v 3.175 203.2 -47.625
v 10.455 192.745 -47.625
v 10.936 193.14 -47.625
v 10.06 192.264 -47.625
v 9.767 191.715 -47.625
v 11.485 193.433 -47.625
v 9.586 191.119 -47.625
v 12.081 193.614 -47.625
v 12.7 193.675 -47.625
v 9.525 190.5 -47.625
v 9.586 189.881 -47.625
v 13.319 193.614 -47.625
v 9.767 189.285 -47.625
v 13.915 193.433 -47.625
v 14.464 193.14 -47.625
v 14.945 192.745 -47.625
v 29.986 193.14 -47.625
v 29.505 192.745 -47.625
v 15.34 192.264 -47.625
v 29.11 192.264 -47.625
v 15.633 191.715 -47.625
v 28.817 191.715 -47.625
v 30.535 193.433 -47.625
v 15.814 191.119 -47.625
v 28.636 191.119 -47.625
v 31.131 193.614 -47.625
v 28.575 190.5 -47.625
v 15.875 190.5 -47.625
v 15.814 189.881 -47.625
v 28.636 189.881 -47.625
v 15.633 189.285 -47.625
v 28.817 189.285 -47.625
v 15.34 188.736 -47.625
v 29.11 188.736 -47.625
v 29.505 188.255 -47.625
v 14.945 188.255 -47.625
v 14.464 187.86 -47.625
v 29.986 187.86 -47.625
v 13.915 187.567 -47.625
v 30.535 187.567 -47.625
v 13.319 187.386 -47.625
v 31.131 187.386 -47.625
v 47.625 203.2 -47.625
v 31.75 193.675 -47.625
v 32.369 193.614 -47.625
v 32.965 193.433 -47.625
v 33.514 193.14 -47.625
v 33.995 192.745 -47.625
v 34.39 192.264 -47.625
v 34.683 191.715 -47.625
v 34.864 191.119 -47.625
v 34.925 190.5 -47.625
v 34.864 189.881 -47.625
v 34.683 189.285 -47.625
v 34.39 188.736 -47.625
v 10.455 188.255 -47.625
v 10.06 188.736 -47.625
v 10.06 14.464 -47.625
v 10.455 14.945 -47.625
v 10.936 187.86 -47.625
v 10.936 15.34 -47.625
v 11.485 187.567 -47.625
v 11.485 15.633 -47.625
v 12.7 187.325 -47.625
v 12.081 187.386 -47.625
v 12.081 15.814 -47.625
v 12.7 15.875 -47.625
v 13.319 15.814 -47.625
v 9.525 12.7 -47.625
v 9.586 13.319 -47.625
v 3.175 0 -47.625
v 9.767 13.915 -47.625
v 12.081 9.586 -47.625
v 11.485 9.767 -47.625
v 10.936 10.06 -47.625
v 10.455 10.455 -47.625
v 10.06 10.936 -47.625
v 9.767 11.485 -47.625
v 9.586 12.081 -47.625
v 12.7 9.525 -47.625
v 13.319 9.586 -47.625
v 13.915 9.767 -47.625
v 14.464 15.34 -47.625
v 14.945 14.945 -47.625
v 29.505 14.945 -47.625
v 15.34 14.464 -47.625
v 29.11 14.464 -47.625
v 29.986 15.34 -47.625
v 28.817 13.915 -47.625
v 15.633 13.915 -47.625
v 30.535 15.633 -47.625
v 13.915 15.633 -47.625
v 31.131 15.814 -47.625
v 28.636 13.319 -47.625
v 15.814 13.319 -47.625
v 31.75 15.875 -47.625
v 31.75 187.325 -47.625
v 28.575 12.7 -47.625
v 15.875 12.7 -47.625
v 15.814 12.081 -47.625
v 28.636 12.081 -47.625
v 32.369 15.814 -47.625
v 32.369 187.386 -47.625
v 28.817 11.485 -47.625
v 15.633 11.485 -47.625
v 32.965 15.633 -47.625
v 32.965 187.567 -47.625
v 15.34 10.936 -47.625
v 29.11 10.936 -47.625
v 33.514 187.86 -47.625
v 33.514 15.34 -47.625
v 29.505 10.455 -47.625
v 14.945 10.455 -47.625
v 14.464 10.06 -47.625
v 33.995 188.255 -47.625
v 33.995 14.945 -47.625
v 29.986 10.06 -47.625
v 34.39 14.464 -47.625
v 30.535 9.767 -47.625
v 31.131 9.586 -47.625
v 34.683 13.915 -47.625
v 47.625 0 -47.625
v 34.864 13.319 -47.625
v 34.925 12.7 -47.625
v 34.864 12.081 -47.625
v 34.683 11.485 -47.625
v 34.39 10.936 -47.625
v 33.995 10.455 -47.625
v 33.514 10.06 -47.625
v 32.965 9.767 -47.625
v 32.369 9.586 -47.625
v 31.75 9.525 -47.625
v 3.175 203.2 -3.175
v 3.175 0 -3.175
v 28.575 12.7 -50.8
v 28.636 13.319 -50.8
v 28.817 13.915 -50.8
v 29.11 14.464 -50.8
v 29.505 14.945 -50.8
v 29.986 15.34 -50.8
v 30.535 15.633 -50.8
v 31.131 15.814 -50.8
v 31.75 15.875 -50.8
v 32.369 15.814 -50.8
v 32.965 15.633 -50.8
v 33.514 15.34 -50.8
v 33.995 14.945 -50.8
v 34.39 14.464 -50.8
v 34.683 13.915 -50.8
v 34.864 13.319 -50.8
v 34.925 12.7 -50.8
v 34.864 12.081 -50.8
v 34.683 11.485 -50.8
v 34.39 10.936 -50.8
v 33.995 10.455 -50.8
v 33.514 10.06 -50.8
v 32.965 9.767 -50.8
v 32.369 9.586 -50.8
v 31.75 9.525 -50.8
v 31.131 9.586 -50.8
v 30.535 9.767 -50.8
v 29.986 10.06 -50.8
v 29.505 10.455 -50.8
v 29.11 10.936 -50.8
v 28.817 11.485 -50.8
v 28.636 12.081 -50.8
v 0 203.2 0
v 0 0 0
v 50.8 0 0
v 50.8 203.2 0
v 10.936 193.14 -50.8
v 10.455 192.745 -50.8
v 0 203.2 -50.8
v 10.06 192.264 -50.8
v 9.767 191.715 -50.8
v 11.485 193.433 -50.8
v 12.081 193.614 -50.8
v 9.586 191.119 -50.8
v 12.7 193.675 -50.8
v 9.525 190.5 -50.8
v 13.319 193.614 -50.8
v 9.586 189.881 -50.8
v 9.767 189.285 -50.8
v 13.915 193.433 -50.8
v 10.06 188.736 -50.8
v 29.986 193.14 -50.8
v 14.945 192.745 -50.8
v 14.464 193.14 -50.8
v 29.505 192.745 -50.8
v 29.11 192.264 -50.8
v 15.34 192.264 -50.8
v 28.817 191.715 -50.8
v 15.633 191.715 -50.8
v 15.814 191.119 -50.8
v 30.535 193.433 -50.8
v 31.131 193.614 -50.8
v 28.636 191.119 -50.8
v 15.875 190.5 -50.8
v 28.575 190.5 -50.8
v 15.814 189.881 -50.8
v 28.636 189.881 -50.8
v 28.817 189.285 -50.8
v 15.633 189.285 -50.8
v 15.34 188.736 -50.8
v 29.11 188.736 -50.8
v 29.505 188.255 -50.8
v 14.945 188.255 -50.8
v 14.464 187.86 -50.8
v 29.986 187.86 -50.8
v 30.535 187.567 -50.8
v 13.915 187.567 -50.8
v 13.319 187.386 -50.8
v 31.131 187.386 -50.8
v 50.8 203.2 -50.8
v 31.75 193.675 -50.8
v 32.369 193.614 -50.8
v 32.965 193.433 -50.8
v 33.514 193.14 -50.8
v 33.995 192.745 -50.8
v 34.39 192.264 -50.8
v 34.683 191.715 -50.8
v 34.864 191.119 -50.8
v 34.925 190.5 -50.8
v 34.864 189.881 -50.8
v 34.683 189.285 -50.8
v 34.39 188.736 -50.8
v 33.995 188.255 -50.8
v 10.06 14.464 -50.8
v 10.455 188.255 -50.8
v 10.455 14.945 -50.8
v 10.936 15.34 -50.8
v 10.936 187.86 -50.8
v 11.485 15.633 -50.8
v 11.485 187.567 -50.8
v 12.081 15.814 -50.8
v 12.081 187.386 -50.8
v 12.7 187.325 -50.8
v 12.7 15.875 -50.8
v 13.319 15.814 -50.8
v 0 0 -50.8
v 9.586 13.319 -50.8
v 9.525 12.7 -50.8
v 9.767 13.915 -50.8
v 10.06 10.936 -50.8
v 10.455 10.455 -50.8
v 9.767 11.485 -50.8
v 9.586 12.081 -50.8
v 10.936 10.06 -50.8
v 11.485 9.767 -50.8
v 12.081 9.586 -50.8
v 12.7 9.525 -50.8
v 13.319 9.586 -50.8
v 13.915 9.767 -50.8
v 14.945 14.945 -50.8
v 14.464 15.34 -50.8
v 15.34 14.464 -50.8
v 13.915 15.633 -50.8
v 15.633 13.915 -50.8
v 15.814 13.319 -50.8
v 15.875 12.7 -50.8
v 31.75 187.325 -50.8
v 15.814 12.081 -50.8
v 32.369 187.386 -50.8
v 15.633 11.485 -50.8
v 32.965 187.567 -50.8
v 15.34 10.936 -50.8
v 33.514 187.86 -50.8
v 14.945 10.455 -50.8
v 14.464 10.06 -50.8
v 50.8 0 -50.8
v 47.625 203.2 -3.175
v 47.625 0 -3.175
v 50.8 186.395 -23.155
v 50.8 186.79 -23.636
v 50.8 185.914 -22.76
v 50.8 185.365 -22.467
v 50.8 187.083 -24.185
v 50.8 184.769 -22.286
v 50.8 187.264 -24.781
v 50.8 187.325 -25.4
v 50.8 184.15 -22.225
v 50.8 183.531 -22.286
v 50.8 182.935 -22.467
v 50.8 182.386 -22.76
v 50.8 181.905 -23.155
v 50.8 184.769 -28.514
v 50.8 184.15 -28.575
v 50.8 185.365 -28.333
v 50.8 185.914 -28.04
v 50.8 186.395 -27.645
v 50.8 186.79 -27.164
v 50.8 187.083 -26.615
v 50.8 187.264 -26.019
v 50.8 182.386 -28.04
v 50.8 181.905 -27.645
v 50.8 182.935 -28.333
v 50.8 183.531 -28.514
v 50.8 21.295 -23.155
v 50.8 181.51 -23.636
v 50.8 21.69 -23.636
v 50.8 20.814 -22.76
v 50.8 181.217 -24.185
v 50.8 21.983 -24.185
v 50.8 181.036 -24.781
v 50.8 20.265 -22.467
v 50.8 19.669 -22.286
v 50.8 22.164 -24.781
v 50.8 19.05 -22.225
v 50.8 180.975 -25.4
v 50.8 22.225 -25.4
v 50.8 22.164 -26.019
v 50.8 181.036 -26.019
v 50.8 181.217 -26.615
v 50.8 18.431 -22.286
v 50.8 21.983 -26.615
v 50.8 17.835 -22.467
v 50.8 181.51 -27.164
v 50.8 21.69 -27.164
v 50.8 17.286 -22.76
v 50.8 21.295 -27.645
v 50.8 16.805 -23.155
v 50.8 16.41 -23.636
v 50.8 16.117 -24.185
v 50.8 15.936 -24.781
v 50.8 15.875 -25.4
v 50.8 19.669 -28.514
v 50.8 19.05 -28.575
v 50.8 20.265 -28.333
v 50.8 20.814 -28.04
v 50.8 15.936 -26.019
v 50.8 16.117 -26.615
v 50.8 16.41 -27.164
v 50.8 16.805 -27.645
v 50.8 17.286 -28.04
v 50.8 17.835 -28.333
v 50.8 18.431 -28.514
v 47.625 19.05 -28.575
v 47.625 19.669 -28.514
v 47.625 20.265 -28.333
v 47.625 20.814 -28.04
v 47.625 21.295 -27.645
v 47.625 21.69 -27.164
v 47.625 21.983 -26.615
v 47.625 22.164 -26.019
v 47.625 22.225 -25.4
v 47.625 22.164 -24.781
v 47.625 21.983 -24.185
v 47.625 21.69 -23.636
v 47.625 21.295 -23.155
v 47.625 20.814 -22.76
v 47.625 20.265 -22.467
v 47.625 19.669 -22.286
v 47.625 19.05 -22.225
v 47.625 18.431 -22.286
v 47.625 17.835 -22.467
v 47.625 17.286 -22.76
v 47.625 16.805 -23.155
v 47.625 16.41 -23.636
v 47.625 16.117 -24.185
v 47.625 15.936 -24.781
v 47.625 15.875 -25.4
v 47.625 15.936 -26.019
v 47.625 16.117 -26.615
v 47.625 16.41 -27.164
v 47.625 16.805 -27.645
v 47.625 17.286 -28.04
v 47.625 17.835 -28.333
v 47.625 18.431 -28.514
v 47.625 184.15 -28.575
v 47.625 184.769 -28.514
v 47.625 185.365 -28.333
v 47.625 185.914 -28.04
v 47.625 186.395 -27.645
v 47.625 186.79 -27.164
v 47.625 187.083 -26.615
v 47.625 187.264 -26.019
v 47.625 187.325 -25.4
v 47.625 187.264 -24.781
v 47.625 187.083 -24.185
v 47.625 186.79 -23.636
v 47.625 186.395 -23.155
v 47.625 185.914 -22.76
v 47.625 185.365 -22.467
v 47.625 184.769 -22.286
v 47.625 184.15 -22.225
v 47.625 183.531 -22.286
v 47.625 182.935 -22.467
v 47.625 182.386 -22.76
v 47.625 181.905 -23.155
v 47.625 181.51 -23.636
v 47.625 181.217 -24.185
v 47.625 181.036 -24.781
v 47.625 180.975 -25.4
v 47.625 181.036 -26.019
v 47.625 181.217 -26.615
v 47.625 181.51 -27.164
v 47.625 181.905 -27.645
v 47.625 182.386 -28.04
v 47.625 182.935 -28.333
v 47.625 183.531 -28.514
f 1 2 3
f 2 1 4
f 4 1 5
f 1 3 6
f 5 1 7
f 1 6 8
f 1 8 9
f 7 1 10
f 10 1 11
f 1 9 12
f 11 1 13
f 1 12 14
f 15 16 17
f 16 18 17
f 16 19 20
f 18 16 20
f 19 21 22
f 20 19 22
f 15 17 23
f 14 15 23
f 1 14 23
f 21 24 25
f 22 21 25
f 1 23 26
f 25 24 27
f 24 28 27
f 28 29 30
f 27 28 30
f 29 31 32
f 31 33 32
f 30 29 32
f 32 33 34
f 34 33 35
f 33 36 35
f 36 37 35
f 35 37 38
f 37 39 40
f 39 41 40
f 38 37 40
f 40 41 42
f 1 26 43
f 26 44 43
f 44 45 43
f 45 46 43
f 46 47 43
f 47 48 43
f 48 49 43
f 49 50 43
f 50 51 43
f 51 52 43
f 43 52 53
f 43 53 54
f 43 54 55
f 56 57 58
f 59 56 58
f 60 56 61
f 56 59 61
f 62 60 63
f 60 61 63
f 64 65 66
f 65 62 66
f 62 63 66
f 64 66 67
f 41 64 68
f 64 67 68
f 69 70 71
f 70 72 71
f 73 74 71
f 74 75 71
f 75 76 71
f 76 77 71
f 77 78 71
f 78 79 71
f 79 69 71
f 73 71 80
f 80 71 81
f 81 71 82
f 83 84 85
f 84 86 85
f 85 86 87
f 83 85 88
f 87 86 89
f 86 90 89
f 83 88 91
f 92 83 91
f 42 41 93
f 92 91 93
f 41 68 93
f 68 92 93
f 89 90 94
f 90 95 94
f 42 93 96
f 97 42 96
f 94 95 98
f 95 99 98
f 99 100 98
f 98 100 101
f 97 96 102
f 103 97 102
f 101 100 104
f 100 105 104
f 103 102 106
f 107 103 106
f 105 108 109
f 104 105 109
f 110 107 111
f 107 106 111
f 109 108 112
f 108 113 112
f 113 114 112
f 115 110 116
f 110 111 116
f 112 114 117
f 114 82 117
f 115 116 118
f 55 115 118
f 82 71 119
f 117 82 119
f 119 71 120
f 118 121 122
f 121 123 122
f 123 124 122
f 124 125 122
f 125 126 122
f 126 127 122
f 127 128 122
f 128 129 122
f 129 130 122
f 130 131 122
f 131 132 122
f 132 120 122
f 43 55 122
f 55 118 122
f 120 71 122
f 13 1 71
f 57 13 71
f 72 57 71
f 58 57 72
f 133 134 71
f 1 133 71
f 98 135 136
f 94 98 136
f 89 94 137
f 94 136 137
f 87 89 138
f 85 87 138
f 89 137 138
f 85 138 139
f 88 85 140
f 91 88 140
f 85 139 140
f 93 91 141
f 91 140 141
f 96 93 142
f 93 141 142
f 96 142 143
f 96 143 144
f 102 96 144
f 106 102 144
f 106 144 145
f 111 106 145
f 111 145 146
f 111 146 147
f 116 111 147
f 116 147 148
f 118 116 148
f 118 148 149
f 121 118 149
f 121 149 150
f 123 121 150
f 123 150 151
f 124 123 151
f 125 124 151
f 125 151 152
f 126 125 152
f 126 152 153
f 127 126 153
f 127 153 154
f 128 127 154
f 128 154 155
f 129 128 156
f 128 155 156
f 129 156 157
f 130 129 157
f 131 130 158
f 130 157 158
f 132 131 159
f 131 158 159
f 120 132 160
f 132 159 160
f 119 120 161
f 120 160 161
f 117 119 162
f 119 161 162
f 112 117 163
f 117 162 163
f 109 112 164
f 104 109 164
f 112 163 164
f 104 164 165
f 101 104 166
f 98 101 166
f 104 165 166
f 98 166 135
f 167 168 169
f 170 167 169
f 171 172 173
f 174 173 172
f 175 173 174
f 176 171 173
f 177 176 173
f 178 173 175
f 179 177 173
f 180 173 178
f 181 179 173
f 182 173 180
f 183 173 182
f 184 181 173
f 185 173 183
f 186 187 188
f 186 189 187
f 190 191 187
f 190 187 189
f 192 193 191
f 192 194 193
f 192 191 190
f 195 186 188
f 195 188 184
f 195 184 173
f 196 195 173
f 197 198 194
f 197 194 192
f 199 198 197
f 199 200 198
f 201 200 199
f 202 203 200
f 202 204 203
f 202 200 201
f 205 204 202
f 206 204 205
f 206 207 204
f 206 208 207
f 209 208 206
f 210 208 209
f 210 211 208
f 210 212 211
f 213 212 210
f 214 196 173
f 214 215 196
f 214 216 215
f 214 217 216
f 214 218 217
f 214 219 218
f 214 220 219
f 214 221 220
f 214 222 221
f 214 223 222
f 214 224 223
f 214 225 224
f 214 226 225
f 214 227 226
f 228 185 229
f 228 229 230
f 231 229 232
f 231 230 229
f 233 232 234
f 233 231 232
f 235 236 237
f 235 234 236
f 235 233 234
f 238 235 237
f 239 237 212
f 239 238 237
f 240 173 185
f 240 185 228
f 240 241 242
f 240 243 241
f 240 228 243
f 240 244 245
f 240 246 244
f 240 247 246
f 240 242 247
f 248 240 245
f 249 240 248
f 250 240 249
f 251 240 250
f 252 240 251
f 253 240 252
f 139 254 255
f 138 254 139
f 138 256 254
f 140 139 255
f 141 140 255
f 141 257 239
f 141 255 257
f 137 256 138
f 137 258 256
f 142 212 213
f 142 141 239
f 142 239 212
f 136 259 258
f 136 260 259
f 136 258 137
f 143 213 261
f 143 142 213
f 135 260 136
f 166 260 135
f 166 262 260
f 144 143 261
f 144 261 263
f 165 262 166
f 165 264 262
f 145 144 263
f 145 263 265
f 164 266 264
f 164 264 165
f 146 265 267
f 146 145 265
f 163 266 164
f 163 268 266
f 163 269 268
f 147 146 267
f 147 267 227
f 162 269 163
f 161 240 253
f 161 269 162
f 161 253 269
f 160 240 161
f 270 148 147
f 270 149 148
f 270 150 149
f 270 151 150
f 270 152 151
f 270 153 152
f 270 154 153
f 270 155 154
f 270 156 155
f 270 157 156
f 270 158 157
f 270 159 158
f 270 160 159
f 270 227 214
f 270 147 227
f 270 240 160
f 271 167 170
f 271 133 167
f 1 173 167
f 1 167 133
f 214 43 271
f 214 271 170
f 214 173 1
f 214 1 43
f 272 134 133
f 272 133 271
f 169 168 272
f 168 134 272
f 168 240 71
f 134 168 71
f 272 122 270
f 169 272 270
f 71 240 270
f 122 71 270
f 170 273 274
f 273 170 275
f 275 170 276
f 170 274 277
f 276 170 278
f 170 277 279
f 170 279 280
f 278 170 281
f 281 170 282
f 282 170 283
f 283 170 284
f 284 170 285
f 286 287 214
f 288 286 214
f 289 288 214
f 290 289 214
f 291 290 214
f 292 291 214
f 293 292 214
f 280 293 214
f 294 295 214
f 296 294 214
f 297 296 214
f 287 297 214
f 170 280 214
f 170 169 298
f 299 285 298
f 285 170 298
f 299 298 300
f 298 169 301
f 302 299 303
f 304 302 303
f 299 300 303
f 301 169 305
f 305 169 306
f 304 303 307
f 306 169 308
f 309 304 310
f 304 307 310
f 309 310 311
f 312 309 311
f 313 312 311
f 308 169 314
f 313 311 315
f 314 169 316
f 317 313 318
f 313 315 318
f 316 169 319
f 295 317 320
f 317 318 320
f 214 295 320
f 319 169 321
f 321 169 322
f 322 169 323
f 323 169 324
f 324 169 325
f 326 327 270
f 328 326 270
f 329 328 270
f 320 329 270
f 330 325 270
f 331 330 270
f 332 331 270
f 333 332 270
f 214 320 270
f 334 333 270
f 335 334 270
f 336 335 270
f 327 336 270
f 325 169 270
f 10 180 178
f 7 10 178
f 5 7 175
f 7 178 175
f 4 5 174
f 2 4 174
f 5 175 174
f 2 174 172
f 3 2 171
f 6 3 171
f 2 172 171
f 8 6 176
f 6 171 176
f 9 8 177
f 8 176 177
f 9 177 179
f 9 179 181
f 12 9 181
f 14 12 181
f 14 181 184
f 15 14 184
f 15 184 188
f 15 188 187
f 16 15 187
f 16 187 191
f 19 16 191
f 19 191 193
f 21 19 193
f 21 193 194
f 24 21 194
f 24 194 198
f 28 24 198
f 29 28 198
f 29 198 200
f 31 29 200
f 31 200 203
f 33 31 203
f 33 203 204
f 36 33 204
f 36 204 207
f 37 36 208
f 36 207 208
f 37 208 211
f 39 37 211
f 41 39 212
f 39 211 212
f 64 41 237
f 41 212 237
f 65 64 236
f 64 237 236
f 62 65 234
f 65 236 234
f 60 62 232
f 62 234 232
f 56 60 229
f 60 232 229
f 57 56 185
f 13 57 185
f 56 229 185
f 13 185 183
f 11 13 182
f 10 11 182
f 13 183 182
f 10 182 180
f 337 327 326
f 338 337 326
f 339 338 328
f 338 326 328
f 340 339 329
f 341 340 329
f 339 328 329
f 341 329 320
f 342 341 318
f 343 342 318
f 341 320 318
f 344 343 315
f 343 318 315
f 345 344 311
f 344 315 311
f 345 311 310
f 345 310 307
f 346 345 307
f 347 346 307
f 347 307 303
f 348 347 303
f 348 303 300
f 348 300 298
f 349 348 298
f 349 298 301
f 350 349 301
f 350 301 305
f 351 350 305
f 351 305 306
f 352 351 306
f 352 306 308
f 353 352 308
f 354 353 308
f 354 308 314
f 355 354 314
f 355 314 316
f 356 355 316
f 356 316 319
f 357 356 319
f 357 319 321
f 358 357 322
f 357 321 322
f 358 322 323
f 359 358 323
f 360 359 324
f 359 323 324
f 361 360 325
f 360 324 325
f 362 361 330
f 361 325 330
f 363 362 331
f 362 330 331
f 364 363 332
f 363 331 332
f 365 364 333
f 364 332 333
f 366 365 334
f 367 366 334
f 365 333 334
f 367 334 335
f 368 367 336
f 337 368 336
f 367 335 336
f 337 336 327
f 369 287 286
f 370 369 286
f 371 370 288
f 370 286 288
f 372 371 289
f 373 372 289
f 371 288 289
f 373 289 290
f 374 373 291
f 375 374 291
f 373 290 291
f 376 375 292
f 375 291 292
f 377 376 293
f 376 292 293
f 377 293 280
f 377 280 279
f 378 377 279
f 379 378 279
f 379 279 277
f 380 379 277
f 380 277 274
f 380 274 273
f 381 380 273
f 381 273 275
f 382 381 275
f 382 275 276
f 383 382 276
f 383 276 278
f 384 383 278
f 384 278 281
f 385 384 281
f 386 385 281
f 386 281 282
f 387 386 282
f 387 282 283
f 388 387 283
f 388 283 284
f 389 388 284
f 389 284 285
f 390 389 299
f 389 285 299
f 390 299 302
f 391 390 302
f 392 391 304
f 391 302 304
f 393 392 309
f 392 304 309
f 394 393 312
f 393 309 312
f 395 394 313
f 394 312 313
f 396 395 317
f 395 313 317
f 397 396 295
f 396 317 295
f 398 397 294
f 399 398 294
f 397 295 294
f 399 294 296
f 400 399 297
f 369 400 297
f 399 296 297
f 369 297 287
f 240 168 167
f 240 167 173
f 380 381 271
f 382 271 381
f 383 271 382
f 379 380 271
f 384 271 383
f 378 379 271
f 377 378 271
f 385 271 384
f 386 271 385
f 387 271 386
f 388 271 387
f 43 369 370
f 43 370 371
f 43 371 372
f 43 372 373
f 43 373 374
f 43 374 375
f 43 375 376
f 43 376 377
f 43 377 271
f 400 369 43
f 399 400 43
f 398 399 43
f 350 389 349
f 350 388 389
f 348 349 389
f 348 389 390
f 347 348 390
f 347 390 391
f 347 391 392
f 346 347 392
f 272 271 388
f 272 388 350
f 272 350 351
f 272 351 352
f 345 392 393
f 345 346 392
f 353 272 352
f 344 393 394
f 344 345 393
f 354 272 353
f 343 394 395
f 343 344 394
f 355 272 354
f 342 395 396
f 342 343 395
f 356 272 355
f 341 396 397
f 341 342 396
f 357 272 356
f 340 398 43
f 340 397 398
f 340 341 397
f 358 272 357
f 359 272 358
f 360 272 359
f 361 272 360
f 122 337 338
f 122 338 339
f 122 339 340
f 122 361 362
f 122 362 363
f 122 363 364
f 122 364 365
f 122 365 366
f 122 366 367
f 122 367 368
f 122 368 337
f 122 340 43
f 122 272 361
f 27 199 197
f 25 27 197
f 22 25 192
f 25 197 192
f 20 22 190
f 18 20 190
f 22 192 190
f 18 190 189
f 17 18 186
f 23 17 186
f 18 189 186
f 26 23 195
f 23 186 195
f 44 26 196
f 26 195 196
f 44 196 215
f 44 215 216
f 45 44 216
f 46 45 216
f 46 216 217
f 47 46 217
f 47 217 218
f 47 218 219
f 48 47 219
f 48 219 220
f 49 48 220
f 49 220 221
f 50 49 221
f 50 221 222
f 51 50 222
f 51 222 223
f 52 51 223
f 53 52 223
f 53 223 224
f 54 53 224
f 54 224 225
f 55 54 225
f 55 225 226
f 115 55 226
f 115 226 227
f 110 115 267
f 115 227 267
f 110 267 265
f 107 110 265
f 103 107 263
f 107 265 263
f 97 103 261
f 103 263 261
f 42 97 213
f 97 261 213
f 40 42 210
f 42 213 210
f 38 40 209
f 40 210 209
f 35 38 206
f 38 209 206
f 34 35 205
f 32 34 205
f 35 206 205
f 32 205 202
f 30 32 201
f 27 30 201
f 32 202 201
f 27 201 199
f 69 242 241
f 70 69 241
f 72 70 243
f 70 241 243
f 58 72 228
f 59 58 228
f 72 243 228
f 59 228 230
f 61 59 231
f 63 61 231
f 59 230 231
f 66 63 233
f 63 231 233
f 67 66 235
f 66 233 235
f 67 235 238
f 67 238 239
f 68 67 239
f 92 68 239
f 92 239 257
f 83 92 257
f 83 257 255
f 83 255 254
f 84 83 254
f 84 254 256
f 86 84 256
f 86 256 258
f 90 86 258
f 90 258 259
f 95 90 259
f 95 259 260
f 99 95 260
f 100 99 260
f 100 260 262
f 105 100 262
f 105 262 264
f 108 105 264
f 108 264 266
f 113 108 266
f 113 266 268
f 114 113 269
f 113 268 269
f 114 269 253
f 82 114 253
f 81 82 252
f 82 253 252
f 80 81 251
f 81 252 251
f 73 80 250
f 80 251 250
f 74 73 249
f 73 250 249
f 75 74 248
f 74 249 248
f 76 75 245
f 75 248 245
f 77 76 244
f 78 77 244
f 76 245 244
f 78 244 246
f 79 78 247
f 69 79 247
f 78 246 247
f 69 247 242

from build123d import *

# Parameters (mm, degrees)
SKETCH1_W           = 50.8
SKETCH1_H           = 50.8
SKETCH1_W_2         = 44.45
SKETCH1_H_2         = 44.45
BOSS_EXTRUDE1_DEPTH = 203.2
SKETCH2_R           = 3.175
CUT_EXTRUDE1_DEPTH  = 24.638
SKETCH3_R           = 3.175
CUT_EXTRUDE2_DEPTH  = 24.638


with BuildPart() as part:
    # Sketch1 → Boss-Extrude1 (new body)
    with BuildSketch(Plane(origin=(0, 0, 0), x_dir=(1, 0, 0), z_dir=(0, 1, 0))):
        with Locations((25.4, 25.4)):
            Rectangle(SKETCH1_W, SKETCH1_H)
        with Locations((25.4, 25.4)):
            Rectangle(SKETCH1_W_2, SKETCH1_H_2, mode=Mode.SUBTRACT)
    extrude(amount=BOSS_EXTRUDE1_DEPTH)

    # Sketch2 → Cut-Extrude1 (cut)
    with BuildSketch(Plane(origin=(0, 0, -50.8), x_dir=(-1, 0, 0), z_dir=(0, 0, -1))):
        with Locations((-12.7, 190.5)):
            Circle(SKETCH2_R)
        with Locations((-31.75, 190.5)):
            Circle(SKETCH2_R)
        with Locations((-31.75, 12.7)):
            Circle(SKETCH2_R)
        with Locations((-12.7, 12.7)):
            Circle(SKETCH2_R)
    extrude(amount=-CUT_EXTRUDE1_DEPTH, mode=Mode.SUBTRACT)

    # Sketch3 → Cut-Extrude2 (cut)
    with BuildSketch(Plane(origin=(50.8, 0, 0), x_dir=(0, 0, -1), z_dir=(1, 0, 0))):
        with Locations((25.4, 184.15)):
            Circle(SKETCH3_R)
        with Locations((25.4, 19.05)):
            Circle(SKETCH3_R)
    extrude(amount=-CUT_EXTRUDE2_DEPTH, mode=Mode.SUBTRACT)


solid = part.part
